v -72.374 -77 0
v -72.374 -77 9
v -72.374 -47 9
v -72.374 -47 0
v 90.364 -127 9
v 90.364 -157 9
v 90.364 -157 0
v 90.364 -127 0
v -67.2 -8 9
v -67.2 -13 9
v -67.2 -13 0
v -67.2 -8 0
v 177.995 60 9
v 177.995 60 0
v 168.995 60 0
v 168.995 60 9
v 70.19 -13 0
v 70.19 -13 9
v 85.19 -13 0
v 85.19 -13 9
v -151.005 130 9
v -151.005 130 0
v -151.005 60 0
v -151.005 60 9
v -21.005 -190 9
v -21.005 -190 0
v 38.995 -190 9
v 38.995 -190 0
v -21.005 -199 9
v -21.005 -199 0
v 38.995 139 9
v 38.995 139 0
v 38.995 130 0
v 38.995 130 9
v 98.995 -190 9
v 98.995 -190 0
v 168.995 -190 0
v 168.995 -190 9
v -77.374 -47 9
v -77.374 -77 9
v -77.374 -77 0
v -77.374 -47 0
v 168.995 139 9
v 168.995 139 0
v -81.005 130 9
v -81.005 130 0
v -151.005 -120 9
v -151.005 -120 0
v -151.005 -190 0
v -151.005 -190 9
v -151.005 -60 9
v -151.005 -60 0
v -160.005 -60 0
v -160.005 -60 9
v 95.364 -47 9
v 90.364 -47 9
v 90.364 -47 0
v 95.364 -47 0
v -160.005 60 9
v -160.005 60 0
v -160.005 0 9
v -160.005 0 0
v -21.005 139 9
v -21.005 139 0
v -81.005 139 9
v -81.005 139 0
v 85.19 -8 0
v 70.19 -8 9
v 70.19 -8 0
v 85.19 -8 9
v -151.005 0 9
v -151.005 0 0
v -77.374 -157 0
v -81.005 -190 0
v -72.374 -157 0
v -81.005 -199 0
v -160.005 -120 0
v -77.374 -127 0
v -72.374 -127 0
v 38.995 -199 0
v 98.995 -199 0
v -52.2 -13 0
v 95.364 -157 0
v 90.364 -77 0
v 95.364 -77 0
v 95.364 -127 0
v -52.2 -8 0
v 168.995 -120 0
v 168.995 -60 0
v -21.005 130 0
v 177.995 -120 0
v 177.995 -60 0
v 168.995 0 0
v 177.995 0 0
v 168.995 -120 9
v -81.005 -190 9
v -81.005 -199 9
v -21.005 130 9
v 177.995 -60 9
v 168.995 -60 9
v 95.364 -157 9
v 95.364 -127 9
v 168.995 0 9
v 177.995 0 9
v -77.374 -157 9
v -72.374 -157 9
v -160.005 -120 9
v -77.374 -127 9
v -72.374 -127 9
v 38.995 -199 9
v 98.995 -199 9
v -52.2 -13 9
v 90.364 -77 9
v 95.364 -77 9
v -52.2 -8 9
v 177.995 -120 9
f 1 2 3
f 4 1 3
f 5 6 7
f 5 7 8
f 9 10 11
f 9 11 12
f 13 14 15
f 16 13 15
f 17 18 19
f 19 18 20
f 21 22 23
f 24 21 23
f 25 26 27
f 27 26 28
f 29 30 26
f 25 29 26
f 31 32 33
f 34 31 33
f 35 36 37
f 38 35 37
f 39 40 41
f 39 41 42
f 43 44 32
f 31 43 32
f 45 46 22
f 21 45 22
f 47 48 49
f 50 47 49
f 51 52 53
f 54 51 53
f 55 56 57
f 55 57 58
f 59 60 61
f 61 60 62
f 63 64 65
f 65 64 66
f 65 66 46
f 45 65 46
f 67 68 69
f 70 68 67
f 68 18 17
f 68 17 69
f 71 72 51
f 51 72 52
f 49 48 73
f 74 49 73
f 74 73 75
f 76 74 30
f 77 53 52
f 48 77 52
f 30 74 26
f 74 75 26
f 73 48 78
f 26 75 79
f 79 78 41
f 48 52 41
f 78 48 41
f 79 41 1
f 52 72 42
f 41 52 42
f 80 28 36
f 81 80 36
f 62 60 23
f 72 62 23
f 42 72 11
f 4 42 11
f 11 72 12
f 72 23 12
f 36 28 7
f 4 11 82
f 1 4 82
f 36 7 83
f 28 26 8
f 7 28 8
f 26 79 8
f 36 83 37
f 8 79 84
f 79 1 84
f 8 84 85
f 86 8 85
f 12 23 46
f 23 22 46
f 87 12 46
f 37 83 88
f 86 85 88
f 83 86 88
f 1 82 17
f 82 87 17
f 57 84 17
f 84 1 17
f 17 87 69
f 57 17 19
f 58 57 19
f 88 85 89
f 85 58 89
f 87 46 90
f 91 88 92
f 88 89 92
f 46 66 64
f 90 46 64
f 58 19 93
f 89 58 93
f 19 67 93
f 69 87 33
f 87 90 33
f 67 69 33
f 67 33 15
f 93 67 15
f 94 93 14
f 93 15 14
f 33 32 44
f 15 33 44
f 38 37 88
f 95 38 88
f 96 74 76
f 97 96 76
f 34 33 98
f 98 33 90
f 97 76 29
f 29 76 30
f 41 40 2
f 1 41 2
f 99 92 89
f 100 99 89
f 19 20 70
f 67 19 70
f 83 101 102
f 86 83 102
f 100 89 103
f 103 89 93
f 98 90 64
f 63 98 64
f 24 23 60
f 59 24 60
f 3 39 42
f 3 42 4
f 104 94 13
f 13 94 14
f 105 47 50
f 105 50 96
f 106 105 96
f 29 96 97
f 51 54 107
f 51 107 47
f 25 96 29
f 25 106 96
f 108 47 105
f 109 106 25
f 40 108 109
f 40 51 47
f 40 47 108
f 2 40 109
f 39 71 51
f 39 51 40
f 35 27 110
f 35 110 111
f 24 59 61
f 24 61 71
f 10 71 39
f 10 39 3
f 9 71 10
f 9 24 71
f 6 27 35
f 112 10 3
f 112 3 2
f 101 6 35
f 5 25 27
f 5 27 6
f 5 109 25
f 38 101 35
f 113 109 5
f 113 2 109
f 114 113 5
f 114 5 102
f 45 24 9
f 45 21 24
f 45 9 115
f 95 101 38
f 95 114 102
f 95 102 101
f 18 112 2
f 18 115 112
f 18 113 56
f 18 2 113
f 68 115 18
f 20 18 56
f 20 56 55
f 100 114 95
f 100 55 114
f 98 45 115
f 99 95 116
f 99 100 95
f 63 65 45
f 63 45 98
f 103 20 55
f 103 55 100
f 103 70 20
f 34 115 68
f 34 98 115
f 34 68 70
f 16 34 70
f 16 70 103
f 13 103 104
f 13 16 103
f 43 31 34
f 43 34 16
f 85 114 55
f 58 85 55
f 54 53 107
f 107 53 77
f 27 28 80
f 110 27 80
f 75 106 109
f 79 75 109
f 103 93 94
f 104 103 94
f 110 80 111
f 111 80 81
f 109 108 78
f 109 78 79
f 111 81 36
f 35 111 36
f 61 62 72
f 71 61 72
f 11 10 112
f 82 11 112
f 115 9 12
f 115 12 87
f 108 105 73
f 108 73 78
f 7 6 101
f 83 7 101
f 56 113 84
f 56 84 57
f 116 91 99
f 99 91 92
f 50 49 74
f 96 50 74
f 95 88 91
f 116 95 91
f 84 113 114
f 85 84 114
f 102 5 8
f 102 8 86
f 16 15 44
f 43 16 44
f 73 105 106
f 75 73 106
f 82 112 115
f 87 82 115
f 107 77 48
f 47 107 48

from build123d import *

# Parameters (mm, degrees)
BOSS_EXTRUDE1_DEPTH = 9
SKETCH5_W           = 5
SKETCH5_H           = 30
SKETCH5_W_2         = 15
SKETCH5_H_2         = 5
CUT_EXTRUDE2_DEPTH  = 9


with BuildPart() as part:
    # Sketch2 → Boss-Extrude1 (new body)
    with BuildSketch(Plane.XY):
        Polygon((-151.004642906, 60), (-160.004642906, 60), (-160.004642906, 0), (-151.004642906, 0), (-151.004642906, -60), (-160.004642906, -60), (-160.004642906, -120), (-151.004642906, -120), (-151.004642906, -190), (-81.004642906, -190), (-81.004642906, -199), (-21.004642906, -199), (-21.004642906, -190), (38.995357094, -190), (38.995357094, -199), (98.995357094, -199), (98.995357094, -190), (168.995357094, -190), (168.995357094, -120), (177.995357094, -120), (177.995357094, -60), (168.995357094, -60), (168.995357094, 0), (177.995357094, 0), (177.995357094, 60), (168.995357094, 60), (168.995357094, 130), (168.995357094, 139), (98.995357094, 139), (38.995357094, 139), (38.995357094, 130), (-21.004642906, 130), (-21.004642906, 139), (-81.004642906, 139), (-81.004642906, 130), (-151.004642906, 130), align=None)
    extrude(amount=BOSS_EXTRUDE1_DEPTH)

    # Sketch5 → Cut-Extrude2 (cut)
    with BuildSketch(Plane.XY.offset(9)):
        with Locations((92.864342421, -142)):
            Rectangle(SKETCH5_W, SKETCH5_H)
        with Locations((-59.699642906, -10.5)):
            Rectangle(SKETCH5_W_2, SKETCH5_H_2)
        with Locations((-74.873628233, -62)):
            Rectangle(SKETCH5_W, SKETCH5_H)
        with Locations((-74.873628233, -142)):
            Rectangle(SKETCH5_W, SKETCH5_H)
        with Locations((92.864342421, -62)):
            Rectangle(SKETCH5_W, SKETCH5_H)
        with Locations((77.690357094, -10.5)):
            Rectangle(SKETCH5_W_2, SKETCH5_H_2)
    extrude(amount=-CUT_EXTRUDE2_DEPTH, mode=Mode.SUBTRACT)


solid = part.part
